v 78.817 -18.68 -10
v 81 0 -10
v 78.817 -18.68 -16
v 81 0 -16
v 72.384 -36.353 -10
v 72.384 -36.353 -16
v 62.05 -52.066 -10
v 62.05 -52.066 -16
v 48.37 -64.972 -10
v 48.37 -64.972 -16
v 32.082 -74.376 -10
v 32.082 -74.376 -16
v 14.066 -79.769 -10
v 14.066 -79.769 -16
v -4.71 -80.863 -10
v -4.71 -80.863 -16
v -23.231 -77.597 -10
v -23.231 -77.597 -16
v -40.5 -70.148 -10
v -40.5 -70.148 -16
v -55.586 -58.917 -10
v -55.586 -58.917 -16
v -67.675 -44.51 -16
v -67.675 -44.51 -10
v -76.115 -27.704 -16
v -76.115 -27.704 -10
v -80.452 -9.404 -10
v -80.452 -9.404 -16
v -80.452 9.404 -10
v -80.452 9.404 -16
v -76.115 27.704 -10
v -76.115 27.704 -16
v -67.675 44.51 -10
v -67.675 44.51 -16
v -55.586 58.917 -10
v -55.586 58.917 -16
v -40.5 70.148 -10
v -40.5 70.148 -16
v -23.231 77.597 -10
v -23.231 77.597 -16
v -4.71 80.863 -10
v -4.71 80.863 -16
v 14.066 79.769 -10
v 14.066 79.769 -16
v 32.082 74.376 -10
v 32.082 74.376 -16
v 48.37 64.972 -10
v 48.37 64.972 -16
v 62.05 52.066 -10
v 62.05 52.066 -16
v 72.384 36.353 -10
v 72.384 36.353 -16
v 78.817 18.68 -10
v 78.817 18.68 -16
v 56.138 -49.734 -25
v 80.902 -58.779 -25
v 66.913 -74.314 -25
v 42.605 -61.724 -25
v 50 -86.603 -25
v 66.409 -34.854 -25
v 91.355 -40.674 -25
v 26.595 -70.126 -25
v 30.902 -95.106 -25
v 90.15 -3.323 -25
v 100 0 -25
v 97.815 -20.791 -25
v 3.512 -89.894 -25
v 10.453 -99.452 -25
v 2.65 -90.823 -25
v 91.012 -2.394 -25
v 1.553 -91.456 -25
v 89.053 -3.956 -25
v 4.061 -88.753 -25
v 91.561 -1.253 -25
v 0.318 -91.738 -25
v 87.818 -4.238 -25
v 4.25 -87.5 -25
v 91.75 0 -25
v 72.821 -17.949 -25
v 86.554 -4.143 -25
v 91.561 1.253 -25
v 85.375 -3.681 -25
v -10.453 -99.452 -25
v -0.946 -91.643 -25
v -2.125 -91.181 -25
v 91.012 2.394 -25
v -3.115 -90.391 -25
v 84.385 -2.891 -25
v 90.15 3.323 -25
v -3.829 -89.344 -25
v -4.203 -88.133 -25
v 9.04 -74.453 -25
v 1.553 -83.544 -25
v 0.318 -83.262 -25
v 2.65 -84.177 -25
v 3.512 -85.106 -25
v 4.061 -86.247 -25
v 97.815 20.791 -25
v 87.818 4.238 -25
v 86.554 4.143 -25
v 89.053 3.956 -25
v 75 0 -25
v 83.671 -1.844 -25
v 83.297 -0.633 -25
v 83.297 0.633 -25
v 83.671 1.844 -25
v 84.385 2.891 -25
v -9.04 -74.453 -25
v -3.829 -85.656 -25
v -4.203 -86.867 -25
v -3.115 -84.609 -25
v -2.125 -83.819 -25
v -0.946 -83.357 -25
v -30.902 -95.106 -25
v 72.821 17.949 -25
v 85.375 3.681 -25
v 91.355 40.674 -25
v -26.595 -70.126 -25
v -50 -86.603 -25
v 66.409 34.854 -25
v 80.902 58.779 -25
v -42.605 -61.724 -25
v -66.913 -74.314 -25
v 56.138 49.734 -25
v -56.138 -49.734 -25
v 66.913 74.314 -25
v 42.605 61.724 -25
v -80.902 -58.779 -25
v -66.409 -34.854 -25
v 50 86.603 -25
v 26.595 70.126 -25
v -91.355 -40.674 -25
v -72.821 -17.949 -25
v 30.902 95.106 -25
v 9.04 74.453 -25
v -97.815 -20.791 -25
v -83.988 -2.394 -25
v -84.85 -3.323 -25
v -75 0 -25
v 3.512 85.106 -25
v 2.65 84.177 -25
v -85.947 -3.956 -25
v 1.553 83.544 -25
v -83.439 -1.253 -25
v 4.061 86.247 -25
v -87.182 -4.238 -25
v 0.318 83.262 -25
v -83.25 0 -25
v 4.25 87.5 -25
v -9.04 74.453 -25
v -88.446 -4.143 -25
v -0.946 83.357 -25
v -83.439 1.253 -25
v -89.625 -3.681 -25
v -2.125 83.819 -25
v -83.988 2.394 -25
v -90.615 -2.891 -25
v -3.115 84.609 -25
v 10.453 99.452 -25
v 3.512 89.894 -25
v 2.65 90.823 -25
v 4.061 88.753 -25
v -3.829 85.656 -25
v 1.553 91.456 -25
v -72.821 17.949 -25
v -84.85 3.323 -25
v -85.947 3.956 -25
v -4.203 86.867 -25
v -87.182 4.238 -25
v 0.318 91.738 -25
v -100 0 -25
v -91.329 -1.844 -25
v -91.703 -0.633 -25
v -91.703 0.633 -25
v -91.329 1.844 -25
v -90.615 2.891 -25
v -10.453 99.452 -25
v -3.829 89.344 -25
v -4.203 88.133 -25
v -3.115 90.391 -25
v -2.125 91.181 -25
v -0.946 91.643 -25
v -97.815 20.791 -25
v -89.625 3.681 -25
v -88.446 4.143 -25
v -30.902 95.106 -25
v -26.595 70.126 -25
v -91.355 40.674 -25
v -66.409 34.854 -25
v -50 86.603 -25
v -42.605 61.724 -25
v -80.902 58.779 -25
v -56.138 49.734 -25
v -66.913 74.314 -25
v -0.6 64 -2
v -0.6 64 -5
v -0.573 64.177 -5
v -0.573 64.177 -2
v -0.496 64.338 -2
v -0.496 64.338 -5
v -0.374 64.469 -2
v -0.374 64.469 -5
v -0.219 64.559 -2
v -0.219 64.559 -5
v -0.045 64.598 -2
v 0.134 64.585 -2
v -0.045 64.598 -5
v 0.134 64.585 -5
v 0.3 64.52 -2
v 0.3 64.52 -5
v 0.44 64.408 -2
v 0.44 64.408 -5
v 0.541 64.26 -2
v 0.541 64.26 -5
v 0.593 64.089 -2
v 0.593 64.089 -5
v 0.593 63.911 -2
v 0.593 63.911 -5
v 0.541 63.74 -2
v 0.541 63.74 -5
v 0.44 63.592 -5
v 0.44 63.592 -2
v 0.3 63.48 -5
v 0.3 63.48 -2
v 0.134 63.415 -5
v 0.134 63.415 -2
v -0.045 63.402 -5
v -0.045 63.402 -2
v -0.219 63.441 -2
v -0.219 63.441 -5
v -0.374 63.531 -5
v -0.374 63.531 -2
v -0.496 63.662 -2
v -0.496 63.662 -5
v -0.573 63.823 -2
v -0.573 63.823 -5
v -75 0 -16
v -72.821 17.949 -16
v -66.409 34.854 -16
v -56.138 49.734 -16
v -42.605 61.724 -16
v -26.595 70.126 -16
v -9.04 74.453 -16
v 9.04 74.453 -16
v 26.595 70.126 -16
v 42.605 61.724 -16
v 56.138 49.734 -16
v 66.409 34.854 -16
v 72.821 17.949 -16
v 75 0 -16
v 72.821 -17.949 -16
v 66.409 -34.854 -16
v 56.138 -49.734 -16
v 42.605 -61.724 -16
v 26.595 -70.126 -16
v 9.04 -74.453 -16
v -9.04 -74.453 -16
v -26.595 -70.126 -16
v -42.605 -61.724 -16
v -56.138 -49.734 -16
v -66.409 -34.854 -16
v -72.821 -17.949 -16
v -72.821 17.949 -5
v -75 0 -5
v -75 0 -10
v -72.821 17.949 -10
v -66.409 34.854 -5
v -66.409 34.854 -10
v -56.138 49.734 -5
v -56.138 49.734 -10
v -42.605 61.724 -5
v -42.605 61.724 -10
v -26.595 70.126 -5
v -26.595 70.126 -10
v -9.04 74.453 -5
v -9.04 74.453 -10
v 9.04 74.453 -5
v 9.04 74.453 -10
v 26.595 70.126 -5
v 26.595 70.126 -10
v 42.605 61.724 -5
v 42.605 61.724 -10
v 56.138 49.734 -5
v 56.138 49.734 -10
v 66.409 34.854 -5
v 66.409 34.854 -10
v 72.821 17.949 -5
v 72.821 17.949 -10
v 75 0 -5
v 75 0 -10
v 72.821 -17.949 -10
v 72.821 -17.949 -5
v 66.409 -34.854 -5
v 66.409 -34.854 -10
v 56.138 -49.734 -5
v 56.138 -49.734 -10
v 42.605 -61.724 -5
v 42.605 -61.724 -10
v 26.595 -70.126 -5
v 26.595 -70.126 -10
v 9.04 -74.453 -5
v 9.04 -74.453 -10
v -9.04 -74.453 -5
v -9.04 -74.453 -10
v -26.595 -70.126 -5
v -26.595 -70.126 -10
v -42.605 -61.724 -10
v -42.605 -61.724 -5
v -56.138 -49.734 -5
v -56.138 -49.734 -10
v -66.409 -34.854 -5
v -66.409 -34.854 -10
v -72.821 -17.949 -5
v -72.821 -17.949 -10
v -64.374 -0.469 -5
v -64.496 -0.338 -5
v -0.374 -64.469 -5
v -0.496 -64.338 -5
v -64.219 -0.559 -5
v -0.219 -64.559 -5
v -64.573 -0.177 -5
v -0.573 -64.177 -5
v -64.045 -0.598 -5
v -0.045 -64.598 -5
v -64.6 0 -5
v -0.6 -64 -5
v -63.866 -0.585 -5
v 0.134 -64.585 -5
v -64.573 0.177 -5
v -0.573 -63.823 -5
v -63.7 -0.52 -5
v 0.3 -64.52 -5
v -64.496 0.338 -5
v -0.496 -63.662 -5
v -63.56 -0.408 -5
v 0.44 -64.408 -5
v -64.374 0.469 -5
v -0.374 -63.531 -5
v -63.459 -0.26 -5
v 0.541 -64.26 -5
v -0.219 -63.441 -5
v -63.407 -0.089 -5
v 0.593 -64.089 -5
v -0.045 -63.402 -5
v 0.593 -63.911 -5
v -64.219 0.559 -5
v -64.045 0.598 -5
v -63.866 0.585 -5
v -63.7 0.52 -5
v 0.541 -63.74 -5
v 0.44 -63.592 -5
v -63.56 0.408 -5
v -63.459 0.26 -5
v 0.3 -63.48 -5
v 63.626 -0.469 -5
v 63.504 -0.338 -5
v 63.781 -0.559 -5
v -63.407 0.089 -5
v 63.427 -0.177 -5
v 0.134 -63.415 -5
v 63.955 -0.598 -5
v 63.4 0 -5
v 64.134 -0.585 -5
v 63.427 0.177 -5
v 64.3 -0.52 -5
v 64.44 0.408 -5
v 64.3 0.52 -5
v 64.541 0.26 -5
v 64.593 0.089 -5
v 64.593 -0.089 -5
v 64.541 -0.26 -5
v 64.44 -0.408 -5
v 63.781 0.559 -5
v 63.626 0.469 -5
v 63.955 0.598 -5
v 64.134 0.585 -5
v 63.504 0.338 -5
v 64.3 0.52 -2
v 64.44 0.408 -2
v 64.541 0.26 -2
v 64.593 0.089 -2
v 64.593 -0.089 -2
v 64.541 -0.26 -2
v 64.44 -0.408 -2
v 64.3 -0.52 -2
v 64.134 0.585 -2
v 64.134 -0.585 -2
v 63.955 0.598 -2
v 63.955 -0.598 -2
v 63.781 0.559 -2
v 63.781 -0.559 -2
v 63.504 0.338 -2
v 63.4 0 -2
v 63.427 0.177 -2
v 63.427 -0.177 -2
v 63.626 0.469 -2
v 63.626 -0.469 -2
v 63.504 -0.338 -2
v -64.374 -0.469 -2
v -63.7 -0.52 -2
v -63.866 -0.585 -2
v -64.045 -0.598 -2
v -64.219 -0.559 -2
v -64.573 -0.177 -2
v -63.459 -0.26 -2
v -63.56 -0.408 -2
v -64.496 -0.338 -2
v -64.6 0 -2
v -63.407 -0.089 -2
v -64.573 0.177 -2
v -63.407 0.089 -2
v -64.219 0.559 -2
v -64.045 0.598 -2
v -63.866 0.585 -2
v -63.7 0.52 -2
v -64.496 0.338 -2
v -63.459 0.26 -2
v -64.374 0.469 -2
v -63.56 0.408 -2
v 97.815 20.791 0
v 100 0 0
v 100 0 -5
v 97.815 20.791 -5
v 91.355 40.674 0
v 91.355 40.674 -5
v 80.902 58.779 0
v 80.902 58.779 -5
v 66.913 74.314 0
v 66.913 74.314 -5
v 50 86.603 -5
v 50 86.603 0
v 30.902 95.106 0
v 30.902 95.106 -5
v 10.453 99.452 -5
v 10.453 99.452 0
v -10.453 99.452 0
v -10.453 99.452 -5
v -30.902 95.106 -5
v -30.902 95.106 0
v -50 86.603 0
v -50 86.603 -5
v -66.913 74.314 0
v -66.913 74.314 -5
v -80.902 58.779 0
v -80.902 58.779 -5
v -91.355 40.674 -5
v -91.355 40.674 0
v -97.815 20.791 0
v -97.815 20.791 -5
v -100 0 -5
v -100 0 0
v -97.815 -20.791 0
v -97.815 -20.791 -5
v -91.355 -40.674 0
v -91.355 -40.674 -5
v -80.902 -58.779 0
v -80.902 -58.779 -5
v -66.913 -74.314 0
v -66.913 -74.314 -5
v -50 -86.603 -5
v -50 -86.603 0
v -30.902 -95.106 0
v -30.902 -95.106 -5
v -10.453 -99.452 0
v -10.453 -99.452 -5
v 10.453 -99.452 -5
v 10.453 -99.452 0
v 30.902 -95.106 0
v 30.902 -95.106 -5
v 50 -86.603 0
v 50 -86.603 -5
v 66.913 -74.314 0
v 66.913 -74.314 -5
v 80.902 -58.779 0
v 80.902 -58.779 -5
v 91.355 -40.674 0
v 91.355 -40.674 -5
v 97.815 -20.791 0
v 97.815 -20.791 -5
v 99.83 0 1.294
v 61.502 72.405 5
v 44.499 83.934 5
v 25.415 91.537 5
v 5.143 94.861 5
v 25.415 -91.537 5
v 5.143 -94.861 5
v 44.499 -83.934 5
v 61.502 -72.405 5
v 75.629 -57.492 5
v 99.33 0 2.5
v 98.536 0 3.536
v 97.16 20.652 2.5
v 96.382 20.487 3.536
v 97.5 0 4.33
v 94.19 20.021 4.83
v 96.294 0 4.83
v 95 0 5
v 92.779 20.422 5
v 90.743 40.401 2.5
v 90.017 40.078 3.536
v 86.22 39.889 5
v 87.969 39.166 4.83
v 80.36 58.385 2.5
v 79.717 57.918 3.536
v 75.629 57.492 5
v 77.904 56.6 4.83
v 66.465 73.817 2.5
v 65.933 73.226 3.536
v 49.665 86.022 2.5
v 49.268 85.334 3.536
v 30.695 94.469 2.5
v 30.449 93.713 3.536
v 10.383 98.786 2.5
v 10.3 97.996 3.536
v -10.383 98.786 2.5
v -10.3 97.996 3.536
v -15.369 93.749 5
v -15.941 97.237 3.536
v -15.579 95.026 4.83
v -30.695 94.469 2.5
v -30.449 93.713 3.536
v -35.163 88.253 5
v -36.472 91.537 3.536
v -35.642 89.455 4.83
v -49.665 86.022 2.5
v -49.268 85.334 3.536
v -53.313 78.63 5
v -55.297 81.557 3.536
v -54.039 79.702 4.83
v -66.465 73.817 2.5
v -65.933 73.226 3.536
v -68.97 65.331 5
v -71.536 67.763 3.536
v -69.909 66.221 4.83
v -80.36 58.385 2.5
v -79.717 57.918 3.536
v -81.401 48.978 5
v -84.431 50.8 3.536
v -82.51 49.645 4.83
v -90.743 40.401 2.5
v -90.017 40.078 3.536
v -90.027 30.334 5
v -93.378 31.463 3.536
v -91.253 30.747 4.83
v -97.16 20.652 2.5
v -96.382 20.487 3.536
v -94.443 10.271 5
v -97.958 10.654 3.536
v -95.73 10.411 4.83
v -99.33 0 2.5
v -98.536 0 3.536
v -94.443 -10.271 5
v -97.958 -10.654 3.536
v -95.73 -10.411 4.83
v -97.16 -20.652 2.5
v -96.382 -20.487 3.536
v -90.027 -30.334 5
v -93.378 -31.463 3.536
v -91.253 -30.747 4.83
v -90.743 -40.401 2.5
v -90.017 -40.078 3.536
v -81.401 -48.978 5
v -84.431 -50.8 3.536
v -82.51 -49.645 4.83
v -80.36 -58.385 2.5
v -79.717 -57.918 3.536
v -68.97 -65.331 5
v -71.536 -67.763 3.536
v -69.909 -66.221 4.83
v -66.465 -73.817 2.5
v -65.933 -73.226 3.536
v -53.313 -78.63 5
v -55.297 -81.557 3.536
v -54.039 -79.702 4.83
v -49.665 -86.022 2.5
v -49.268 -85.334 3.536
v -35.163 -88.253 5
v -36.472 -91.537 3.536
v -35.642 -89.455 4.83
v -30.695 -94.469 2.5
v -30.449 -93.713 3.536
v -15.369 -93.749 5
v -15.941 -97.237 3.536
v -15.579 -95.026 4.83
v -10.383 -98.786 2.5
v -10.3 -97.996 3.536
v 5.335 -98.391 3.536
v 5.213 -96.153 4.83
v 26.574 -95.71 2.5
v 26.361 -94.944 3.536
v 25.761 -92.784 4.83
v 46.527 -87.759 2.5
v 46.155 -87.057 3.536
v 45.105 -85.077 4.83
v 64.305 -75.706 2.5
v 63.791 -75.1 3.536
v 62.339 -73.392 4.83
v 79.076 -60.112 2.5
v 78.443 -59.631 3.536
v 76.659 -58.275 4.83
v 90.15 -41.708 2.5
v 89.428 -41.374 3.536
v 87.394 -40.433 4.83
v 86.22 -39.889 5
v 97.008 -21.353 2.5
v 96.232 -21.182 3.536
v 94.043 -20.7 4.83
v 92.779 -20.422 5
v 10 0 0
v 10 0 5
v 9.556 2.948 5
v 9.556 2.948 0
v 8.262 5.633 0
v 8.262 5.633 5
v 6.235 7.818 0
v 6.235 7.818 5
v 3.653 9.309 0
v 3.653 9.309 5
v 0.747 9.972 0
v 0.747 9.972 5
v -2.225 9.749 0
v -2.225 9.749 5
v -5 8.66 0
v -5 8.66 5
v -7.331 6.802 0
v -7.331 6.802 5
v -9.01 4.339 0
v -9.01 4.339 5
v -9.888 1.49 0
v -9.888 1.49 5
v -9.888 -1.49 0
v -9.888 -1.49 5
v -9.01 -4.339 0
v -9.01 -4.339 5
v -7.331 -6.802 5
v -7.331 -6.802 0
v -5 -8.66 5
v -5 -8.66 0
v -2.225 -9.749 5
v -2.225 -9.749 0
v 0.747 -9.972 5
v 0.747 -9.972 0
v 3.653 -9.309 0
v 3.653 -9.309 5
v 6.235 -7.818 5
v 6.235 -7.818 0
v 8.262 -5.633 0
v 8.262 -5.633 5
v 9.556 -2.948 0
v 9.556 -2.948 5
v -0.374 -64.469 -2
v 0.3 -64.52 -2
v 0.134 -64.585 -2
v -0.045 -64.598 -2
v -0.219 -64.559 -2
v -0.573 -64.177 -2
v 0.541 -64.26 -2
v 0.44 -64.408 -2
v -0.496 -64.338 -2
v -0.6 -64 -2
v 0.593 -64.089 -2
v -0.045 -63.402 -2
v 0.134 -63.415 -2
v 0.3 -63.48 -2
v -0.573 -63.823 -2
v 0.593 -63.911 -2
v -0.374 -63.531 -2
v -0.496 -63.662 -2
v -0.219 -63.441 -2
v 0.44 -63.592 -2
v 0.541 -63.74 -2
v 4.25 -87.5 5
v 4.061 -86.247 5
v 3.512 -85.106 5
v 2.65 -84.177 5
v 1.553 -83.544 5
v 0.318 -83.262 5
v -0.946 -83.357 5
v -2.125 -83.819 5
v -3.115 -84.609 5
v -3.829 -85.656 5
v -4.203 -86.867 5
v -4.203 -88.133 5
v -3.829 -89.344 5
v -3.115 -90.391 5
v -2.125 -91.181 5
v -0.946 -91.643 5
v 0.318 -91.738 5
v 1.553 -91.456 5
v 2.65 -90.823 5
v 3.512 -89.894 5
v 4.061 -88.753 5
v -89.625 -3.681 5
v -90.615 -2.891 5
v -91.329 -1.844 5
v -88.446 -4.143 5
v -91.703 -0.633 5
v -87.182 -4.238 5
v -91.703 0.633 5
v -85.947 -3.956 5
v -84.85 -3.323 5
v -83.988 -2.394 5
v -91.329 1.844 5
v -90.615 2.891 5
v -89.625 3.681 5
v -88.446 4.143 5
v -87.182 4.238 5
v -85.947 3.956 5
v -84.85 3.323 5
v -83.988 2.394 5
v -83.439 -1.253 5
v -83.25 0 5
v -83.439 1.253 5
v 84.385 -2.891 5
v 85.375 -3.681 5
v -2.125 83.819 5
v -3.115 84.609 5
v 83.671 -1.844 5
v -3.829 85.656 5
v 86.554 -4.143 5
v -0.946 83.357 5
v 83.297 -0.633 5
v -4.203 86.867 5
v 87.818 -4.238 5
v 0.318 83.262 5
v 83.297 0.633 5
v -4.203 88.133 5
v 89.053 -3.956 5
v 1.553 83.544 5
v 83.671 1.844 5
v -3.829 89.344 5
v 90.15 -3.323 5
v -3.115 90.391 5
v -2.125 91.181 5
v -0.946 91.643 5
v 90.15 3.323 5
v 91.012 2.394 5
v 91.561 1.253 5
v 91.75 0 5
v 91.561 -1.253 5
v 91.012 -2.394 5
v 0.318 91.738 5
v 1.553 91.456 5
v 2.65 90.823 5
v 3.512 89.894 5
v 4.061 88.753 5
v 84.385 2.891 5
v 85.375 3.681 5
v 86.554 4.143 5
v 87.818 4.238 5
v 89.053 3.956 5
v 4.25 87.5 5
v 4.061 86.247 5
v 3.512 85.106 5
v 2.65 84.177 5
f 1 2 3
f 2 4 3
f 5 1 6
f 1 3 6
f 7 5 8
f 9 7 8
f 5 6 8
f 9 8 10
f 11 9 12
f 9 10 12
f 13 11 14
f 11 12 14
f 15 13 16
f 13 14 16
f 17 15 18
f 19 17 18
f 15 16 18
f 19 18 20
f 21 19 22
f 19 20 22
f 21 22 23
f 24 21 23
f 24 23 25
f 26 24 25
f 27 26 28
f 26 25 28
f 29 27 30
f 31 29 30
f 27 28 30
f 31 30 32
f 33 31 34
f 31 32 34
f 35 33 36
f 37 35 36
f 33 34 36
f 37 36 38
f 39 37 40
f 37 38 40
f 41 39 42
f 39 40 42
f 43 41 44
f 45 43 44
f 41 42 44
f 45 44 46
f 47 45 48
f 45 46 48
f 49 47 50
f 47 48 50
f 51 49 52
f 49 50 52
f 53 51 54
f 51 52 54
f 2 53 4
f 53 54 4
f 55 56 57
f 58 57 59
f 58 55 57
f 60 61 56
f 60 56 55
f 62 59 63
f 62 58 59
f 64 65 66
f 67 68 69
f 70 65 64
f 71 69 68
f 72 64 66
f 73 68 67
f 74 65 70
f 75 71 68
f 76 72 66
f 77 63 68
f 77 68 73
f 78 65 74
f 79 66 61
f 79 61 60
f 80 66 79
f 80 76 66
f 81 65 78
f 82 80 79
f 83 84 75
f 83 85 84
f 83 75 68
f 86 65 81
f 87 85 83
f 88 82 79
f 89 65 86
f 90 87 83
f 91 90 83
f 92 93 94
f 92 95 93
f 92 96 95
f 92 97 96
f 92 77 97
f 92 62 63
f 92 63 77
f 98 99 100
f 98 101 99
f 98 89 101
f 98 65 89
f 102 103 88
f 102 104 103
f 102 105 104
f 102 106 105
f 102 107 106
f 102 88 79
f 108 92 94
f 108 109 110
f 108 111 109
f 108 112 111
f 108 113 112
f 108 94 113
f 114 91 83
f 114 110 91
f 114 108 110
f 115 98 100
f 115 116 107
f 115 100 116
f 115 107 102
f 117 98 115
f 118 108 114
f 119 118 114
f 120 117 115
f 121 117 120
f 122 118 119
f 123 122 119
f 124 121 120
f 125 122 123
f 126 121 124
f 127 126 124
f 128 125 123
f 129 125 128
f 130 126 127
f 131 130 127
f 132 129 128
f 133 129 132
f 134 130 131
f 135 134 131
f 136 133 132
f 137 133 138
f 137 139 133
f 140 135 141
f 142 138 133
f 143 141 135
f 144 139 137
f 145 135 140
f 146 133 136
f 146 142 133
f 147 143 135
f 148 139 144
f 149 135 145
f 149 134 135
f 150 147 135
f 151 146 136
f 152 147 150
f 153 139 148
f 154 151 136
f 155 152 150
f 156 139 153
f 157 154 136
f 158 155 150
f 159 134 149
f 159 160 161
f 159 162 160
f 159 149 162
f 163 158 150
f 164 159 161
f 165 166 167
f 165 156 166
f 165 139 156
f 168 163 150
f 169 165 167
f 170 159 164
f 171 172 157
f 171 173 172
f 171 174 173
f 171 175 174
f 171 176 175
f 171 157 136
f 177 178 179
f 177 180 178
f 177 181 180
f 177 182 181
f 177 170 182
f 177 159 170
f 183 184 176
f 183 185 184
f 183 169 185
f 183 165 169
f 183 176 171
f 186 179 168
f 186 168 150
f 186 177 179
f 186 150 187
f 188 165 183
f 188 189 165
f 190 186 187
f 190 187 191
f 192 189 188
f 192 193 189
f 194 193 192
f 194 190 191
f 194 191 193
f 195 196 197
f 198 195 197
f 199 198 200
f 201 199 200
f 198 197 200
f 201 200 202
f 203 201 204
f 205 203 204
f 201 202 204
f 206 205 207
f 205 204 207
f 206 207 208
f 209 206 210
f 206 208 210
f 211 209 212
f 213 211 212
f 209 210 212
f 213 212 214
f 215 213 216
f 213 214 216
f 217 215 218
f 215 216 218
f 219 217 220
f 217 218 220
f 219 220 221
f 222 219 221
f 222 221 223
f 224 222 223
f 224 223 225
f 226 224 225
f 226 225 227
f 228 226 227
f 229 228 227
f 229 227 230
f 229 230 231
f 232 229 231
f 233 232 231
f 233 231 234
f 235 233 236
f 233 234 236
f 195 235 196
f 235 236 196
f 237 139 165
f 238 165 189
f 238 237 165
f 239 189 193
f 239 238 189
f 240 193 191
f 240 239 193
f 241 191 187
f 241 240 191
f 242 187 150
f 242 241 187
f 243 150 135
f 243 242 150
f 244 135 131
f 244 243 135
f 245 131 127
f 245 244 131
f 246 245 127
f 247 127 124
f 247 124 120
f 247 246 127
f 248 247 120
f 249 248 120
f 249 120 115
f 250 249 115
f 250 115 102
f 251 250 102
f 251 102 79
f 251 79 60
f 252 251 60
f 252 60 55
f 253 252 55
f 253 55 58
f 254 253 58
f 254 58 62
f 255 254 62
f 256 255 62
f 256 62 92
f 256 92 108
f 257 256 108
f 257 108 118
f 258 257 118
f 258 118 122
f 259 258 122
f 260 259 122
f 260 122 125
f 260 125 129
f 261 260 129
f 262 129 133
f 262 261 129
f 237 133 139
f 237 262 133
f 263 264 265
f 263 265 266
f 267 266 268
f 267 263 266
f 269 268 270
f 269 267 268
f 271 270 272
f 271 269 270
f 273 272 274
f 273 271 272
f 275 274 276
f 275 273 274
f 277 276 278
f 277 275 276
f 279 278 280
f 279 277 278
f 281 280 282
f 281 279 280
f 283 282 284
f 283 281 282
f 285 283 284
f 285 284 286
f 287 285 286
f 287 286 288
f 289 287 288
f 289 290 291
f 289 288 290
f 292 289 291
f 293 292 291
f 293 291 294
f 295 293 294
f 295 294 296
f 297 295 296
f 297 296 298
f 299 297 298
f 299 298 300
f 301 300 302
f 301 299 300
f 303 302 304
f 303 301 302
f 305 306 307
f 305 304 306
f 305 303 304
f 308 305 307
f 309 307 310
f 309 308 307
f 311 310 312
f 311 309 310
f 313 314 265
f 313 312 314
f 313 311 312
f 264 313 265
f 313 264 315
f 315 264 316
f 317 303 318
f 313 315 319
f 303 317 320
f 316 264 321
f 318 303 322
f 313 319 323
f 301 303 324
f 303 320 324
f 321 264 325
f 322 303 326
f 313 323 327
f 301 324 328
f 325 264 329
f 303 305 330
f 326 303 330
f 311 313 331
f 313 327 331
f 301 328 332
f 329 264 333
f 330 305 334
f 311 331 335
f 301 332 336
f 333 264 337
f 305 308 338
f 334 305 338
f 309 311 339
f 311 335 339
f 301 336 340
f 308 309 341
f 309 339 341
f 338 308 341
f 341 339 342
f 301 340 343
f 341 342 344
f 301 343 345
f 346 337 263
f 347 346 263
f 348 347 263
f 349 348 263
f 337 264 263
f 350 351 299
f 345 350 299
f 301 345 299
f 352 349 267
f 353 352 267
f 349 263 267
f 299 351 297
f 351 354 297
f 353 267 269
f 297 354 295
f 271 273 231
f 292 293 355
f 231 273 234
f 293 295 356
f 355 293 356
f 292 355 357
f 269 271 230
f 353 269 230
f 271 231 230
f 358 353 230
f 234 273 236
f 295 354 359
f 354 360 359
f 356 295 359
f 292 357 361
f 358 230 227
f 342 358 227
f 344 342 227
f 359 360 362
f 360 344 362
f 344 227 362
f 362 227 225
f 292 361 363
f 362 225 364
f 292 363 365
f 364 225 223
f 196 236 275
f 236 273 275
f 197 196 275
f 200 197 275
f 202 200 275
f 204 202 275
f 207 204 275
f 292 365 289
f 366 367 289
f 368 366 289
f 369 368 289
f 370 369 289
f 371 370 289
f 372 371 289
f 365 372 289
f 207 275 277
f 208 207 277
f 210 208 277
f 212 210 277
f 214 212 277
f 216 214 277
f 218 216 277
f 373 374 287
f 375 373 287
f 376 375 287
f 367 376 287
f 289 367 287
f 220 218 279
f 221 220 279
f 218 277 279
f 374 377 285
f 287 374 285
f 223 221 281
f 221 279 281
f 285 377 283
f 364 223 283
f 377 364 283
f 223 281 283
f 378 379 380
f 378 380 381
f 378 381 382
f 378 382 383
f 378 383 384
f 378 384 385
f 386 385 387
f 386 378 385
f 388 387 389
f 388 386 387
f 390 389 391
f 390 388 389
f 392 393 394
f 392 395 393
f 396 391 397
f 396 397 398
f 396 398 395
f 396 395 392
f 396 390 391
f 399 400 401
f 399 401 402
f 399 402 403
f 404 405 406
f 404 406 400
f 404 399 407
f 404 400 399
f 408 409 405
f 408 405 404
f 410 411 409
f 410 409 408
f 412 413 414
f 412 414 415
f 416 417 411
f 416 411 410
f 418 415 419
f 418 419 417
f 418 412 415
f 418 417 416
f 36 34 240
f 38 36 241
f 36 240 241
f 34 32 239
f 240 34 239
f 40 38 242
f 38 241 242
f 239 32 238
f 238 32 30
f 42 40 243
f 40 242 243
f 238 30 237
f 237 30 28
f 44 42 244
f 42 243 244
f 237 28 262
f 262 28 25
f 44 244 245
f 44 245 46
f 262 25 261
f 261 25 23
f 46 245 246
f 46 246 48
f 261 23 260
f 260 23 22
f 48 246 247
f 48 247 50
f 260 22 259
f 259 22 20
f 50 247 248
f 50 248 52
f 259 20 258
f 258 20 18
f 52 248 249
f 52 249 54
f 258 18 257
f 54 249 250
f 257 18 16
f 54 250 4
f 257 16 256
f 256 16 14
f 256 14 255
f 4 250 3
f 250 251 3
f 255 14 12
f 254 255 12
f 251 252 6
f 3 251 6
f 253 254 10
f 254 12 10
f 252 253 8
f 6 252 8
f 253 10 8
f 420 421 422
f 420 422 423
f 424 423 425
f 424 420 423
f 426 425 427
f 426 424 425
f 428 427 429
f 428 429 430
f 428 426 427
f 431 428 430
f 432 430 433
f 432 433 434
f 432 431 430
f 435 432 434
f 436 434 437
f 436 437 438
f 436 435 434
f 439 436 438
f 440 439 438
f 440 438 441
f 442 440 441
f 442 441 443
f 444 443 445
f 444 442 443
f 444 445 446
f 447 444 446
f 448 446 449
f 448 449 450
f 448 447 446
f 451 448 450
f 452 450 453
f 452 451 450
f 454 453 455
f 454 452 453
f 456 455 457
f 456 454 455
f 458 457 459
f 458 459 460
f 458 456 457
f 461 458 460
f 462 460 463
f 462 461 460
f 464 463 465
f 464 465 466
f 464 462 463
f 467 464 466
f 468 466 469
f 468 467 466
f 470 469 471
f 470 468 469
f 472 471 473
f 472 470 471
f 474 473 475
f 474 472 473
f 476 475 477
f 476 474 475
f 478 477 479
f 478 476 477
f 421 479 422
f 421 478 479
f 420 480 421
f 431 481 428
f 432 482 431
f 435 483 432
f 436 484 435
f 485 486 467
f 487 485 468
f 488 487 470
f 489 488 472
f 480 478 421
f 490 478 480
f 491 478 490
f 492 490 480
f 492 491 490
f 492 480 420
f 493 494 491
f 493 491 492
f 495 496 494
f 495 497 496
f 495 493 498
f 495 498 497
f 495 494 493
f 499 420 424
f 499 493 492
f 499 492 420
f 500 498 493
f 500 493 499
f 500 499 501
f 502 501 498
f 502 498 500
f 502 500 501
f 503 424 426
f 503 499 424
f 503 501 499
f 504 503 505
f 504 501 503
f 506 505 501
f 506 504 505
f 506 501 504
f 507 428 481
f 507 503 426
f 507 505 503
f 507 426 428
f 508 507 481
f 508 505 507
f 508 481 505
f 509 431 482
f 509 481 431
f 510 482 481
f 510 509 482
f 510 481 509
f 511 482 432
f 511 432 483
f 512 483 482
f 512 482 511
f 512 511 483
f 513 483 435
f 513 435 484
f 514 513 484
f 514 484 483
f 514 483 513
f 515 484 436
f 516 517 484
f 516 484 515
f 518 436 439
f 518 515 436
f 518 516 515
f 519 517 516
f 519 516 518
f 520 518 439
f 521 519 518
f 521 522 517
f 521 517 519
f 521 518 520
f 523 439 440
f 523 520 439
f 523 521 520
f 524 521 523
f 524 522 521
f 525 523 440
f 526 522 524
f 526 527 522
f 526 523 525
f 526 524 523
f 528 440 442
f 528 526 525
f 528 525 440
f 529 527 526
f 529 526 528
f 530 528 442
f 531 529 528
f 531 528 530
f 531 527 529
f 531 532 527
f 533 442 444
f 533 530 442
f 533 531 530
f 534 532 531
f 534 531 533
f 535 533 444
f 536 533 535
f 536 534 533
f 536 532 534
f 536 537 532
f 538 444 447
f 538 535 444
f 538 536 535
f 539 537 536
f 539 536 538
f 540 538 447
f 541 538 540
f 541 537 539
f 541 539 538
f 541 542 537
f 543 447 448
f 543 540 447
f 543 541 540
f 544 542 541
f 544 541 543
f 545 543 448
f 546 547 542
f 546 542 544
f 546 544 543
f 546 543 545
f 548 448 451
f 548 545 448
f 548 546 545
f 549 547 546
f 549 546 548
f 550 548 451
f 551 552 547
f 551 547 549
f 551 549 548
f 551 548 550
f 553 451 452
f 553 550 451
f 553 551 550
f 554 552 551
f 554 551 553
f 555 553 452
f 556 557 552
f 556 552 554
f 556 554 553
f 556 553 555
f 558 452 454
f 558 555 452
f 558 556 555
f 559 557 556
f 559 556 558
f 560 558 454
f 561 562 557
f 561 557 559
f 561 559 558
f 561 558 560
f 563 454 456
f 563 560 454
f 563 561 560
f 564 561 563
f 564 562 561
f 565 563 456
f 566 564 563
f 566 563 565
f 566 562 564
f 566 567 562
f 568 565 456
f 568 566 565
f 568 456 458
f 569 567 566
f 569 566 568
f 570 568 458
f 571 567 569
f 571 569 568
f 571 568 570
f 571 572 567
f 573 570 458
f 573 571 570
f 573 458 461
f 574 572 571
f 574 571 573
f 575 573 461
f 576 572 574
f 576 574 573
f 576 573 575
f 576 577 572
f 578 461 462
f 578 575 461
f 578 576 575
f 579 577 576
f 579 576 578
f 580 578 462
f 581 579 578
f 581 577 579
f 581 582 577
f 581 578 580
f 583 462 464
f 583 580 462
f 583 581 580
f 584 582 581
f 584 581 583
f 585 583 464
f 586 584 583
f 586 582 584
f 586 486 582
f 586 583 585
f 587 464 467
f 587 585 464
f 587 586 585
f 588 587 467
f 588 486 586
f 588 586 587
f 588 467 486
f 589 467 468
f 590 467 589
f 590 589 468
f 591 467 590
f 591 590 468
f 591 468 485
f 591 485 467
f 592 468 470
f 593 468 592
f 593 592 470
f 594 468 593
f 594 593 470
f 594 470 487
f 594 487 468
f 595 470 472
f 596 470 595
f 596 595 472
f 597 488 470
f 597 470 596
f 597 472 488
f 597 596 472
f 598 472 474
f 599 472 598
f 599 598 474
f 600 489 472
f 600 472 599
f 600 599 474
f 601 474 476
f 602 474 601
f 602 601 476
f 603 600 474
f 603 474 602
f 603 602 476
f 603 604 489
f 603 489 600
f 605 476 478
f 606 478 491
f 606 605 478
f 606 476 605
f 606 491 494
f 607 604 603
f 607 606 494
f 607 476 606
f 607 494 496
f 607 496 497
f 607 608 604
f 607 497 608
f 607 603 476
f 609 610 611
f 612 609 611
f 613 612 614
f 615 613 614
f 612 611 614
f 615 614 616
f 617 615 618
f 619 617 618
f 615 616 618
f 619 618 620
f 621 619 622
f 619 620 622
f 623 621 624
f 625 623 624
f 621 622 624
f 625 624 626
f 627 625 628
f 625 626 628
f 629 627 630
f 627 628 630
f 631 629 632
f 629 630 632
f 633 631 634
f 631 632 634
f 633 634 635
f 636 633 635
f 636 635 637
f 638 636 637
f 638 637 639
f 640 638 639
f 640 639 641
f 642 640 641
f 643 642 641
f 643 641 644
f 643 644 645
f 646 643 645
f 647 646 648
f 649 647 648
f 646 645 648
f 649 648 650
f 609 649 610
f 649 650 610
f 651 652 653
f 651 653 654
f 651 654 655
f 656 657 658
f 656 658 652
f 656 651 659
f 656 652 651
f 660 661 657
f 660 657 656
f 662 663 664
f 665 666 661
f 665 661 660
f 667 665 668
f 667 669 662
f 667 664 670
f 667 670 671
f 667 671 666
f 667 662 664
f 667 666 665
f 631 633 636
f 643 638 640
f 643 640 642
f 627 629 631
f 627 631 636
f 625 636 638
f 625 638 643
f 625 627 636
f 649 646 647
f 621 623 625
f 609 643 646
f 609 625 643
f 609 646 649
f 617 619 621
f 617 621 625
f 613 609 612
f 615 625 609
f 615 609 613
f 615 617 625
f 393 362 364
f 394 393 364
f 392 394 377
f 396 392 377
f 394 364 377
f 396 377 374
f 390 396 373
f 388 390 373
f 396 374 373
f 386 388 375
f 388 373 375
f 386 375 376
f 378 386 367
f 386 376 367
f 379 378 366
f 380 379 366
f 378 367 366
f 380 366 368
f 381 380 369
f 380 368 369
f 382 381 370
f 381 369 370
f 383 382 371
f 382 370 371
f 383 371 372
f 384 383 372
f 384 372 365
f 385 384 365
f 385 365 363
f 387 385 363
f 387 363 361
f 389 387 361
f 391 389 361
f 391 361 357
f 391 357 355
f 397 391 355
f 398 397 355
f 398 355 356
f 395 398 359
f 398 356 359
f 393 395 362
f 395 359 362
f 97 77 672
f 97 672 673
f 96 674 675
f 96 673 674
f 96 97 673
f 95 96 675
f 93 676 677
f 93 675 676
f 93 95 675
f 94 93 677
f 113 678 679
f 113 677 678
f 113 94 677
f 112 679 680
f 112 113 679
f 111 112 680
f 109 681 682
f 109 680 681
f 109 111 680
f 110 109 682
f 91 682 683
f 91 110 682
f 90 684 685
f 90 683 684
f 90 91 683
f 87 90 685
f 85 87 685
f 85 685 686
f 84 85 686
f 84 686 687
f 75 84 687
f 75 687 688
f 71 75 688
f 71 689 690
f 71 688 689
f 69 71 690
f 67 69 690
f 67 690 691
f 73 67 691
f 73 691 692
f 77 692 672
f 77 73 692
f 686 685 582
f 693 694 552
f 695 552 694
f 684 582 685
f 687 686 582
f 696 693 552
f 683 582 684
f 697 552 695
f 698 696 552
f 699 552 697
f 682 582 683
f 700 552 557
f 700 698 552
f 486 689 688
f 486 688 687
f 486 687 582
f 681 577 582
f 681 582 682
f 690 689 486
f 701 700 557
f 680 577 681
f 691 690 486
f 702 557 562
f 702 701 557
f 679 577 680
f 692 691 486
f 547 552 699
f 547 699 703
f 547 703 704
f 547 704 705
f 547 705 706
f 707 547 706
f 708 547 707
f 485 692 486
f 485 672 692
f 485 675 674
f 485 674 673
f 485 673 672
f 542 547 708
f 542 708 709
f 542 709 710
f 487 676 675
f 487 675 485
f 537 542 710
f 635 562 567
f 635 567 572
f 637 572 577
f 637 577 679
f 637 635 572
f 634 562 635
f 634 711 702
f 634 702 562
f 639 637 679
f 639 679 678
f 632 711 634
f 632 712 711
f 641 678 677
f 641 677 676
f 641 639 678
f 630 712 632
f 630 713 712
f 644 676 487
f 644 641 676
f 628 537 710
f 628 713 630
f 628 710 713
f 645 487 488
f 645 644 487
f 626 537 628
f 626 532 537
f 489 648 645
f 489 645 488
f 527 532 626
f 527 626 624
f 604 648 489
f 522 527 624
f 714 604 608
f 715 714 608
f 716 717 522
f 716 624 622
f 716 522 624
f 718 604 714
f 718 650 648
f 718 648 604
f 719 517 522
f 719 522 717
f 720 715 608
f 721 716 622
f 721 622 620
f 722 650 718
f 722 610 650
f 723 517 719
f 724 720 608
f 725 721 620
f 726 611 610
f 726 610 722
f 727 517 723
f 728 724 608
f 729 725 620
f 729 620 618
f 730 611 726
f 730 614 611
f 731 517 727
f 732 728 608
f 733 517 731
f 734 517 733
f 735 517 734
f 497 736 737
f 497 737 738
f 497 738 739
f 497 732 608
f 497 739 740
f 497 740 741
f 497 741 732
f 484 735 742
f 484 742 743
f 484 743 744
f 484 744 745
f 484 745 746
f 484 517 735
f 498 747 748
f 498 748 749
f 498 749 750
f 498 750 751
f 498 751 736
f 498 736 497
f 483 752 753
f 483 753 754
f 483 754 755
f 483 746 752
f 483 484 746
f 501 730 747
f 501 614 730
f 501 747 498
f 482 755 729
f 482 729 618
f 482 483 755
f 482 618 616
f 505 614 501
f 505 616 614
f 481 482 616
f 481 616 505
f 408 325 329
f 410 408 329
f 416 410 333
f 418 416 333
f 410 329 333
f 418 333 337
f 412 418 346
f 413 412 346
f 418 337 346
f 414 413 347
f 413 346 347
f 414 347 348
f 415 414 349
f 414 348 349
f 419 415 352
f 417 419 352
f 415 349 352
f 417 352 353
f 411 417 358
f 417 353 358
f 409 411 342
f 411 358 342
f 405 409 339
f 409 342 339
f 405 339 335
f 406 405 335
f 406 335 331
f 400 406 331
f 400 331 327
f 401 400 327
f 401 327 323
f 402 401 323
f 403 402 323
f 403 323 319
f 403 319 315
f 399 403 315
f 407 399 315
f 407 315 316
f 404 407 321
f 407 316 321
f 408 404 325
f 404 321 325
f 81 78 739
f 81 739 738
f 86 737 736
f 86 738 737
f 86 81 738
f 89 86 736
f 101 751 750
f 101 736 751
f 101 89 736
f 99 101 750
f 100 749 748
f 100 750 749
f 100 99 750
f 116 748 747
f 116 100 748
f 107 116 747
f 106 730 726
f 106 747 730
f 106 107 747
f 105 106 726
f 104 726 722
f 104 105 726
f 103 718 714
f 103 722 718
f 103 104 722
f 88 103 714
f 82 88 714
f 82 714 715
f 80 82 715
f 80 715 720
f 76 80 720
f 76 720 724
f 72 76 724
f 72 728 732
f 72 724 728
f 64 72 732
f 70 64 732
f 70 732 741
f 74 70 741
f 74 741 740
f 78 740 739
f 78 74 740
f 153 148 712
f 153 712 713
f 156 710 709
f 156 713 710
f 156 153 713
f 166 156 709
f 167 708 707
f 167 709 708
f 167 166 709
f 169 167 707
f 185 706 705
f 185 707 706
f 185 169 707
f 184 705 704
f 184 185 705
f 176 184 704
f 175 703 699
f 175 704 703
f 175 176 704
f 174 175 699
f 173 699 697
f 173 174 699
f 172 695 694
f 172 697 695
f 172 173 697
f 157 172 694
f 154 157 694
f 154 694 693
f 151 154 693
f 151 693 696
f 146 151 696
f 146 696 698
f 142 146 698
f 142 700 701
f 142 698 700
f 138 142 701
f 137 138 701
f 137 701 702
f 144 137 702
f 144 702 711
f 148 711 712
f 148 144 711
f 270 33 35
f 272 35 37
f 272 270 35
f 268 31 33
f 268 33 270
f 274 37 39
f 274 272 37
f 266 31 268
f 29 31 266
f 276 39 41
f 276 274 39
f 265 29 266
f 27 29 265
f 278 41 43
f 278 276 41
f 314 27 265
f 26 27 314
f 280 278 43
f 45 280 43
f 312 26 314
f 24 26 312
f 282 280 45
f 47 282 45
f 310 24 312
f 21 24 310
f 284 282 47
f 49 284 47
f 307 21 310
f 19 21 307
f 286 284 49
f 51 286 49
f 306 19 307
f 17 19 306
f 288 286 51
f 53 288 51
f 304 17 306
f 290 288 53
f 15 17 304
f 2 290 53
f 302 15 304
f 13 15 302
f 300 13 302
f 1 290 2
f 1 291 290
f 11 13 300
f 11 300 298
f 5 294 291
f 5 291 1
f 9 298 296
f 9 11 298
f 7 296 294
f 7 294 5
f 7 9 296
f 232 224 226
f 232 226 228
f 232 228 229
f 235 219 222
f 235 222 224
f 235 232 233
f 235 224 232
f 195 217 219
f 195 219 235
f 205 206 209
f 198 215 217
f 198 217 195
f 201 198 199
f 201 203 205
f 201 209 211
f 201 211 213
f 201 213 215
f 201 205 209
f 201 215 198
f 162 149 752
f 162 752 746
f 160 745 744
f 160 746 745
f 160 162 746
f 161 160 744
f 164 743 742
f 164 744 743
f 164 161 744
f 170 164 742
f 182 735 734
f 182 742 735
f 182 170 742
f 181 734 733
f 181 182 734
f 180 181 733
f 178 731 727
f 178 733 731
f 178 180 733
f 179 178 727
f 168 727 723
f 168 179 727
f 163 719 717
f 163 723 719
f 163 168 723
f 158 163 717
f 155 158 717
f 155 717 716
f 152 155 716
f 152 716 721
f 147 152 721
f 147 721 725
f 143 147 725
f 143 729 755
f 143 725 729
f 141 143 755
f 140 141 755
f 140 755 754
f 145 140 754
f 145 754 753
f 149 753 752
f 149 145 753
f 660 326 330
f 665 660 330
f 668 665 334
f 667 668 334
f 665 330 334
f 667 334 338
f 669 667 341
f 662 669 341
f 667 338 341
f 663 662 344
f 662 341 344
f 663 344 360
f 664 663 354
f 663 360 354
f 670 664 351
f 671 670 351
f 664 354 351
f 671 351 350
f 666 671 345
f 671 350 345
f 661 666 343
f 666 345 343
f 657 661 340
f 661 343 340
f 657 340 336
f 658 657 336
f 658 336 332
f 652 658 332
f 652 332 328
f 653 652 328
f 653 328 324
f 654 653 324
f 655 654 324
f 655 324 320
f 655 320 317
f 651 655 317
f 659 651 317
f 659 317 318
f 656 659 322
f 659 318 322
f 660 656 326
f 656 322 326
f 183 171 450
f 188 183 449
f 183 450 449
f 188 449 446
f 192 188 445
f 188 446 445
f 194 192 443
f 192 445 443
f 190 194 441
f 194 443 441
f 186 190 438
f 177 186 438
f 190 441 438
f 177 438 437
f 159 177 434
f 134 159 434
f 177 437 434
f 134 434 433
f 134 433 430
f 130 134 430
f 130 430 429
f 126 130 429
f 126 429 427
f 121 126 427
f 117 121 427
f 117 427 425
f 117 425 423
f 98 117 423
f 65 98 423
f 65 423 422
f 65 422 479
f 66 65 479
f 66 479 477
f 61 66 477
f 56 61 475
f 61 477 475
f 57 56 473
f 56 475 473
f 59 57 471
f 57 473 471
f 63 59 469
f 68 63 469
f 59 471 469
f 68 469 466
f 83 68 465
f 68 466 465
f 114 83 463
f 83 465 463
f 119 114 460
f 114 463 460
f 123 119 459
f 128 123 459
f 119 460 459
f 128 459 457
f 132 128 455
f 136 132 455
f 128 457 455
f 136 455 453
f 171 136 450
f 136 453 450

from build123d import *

# Parameters (mm, degrees)
SZKIC1_R                        = 100
DODANIE_WYCI_GNI_CIE2_DEPTH     = 5
SZKIC2_R                        = 100
SZKIC2_R_2                      = 75
DODANIE_WYCI_GNI_CIE3_DEPTH     = 20
ZAOKR_GLENIE1_R                 = 5
SZKIC4_R                        = 10
WYTNIJ_WYCI_GNI_CIE2_DEPTH      = 5
WYTNIJ_WYCI_GNI_CIE3_DEPTH      = 145.568323017
WYTNIJ_WYCI_GNI_CIE3_DEPTH_BACK = 145.568323017
SZKIC3_R                        = 4.25
SZKIC5_W                        = 6
SZKIC5_H                        = 6
SZKIC6_R                        = 0.6
WYTNIJ_WYCI_GNI_CIE4_DEPTH      = 3


with BuildPart() as part:
    # Szkic1 → Dodanie-wyciągnięcie2 (new, symmetric)
    with BuildSketch(Plane.XY):
        Circle(SZKIC1_R)
    extrude(amount=DODANIE_WYCI_GNI_CIE2_DEPTH, both=True)

    # Szkic2 → Dodanie-wyciągnięcie3 (add)
    with BuildSketch(Plane(origin=(0, 0, -5), x_dir=(-1, 0, 0), z_dir=(0, 0, -1))):
        Circle(SZKIC2_R)
        Circle(SZKIC2_R_2, mode=Mode.SUBTRACT)
    extrude(amount=DODANIE_WYCI_GNI_CIE3_DEPTH)

    # Zaokrąglenie1
    zaokr_glenie1_edges = [part.edges().sort_by_distance(p)[0] for p in [
        (-100, 0, 5),
    ]]
    fillet(zaokr_glenie1_edges, radius=ZAOKR_GLENIE1_R)

    # Szkic4 → Wytnij-wyciągnięcie2 (cut)
    with BuildSketch(Plane.XY.offset(5)):
        Circle(SZKIC4_R)
    extrude(amount=-WYTNIJ_WYCI_GNI_CIE2_DEPTH, mode=Mode.SUBTRACT)

    # Szkic3 → Wytnij-wyciągnięcie3 (cut, two sides: drawn at the far end of the back side and taken through both)
    with BuildSketch(Plane.XY.offset(5).offset(-WYTNIJ_WYCI_GNI_CIE3_DEPTH_BACK)):
        with Locations((87.5, 0)):
            Circle(SZKIC3_R)
        with Locations((0, 87.5)):
            Circle(SZKIC3_R)
        with Locations((0, -87.5)):
            Circle(SZKIC3_R)
        with Locations((-87.5, 0)):
            Circle(SZKIC3_R)
    extrude(amount=WYTNIJ_WYCI_GNI_CIE3_DEPTH + WYTNIJ_WYCI_GNI_CIE3_DEPTH_BACK, mode=Mode.SUBTRACT)

    # Szkic5 → Wycięcie-obrót1 (revolve, cut)
    with BuildSketch(Plane(origin=(0, 0, 0), x_dir=(1, 0, 0), z_dir=(0, 1, 0)), mode=Mode.PRIVATE) as wyci_cie_obr_t1_sk:
        with Locations((-78, 13)):
            Rectangle(SZKIC5_W, SZKIC5_H)
    revolve(wyci_cie_obr_t1_sk.sketch.rotate(Axis((0, 0, 17.369843618), (0, 0, -1)), 180), axis=Axis((0, 0, 17.369843618), (0, 0, -1)), mode=Mode.SUBTRACT)

    # Szkic6 → Wytnij-wyciągnięcie4 (cut)
    with BuildSketch(Plane(origin=(0, 0, -5), x_dir=(-1, 0, 0), z_dir=(0, 0, -1))):
        with Locations((0, -64)):
            Circle(SZKIC6_R)
        with Locations((-64, 0)):
            Circle(SZKIC6_R)
        with Locations((0, 64)):
            Circle(SZKIC6_R)
        with Locations((64, 0)):
            Circle(SZKIC6_R)
    extrude(amount=-WYTNIJ_WYCI_GNI_CIE4_DEPTH, mode=Mode.SUBTRACT)


solid = part.part
